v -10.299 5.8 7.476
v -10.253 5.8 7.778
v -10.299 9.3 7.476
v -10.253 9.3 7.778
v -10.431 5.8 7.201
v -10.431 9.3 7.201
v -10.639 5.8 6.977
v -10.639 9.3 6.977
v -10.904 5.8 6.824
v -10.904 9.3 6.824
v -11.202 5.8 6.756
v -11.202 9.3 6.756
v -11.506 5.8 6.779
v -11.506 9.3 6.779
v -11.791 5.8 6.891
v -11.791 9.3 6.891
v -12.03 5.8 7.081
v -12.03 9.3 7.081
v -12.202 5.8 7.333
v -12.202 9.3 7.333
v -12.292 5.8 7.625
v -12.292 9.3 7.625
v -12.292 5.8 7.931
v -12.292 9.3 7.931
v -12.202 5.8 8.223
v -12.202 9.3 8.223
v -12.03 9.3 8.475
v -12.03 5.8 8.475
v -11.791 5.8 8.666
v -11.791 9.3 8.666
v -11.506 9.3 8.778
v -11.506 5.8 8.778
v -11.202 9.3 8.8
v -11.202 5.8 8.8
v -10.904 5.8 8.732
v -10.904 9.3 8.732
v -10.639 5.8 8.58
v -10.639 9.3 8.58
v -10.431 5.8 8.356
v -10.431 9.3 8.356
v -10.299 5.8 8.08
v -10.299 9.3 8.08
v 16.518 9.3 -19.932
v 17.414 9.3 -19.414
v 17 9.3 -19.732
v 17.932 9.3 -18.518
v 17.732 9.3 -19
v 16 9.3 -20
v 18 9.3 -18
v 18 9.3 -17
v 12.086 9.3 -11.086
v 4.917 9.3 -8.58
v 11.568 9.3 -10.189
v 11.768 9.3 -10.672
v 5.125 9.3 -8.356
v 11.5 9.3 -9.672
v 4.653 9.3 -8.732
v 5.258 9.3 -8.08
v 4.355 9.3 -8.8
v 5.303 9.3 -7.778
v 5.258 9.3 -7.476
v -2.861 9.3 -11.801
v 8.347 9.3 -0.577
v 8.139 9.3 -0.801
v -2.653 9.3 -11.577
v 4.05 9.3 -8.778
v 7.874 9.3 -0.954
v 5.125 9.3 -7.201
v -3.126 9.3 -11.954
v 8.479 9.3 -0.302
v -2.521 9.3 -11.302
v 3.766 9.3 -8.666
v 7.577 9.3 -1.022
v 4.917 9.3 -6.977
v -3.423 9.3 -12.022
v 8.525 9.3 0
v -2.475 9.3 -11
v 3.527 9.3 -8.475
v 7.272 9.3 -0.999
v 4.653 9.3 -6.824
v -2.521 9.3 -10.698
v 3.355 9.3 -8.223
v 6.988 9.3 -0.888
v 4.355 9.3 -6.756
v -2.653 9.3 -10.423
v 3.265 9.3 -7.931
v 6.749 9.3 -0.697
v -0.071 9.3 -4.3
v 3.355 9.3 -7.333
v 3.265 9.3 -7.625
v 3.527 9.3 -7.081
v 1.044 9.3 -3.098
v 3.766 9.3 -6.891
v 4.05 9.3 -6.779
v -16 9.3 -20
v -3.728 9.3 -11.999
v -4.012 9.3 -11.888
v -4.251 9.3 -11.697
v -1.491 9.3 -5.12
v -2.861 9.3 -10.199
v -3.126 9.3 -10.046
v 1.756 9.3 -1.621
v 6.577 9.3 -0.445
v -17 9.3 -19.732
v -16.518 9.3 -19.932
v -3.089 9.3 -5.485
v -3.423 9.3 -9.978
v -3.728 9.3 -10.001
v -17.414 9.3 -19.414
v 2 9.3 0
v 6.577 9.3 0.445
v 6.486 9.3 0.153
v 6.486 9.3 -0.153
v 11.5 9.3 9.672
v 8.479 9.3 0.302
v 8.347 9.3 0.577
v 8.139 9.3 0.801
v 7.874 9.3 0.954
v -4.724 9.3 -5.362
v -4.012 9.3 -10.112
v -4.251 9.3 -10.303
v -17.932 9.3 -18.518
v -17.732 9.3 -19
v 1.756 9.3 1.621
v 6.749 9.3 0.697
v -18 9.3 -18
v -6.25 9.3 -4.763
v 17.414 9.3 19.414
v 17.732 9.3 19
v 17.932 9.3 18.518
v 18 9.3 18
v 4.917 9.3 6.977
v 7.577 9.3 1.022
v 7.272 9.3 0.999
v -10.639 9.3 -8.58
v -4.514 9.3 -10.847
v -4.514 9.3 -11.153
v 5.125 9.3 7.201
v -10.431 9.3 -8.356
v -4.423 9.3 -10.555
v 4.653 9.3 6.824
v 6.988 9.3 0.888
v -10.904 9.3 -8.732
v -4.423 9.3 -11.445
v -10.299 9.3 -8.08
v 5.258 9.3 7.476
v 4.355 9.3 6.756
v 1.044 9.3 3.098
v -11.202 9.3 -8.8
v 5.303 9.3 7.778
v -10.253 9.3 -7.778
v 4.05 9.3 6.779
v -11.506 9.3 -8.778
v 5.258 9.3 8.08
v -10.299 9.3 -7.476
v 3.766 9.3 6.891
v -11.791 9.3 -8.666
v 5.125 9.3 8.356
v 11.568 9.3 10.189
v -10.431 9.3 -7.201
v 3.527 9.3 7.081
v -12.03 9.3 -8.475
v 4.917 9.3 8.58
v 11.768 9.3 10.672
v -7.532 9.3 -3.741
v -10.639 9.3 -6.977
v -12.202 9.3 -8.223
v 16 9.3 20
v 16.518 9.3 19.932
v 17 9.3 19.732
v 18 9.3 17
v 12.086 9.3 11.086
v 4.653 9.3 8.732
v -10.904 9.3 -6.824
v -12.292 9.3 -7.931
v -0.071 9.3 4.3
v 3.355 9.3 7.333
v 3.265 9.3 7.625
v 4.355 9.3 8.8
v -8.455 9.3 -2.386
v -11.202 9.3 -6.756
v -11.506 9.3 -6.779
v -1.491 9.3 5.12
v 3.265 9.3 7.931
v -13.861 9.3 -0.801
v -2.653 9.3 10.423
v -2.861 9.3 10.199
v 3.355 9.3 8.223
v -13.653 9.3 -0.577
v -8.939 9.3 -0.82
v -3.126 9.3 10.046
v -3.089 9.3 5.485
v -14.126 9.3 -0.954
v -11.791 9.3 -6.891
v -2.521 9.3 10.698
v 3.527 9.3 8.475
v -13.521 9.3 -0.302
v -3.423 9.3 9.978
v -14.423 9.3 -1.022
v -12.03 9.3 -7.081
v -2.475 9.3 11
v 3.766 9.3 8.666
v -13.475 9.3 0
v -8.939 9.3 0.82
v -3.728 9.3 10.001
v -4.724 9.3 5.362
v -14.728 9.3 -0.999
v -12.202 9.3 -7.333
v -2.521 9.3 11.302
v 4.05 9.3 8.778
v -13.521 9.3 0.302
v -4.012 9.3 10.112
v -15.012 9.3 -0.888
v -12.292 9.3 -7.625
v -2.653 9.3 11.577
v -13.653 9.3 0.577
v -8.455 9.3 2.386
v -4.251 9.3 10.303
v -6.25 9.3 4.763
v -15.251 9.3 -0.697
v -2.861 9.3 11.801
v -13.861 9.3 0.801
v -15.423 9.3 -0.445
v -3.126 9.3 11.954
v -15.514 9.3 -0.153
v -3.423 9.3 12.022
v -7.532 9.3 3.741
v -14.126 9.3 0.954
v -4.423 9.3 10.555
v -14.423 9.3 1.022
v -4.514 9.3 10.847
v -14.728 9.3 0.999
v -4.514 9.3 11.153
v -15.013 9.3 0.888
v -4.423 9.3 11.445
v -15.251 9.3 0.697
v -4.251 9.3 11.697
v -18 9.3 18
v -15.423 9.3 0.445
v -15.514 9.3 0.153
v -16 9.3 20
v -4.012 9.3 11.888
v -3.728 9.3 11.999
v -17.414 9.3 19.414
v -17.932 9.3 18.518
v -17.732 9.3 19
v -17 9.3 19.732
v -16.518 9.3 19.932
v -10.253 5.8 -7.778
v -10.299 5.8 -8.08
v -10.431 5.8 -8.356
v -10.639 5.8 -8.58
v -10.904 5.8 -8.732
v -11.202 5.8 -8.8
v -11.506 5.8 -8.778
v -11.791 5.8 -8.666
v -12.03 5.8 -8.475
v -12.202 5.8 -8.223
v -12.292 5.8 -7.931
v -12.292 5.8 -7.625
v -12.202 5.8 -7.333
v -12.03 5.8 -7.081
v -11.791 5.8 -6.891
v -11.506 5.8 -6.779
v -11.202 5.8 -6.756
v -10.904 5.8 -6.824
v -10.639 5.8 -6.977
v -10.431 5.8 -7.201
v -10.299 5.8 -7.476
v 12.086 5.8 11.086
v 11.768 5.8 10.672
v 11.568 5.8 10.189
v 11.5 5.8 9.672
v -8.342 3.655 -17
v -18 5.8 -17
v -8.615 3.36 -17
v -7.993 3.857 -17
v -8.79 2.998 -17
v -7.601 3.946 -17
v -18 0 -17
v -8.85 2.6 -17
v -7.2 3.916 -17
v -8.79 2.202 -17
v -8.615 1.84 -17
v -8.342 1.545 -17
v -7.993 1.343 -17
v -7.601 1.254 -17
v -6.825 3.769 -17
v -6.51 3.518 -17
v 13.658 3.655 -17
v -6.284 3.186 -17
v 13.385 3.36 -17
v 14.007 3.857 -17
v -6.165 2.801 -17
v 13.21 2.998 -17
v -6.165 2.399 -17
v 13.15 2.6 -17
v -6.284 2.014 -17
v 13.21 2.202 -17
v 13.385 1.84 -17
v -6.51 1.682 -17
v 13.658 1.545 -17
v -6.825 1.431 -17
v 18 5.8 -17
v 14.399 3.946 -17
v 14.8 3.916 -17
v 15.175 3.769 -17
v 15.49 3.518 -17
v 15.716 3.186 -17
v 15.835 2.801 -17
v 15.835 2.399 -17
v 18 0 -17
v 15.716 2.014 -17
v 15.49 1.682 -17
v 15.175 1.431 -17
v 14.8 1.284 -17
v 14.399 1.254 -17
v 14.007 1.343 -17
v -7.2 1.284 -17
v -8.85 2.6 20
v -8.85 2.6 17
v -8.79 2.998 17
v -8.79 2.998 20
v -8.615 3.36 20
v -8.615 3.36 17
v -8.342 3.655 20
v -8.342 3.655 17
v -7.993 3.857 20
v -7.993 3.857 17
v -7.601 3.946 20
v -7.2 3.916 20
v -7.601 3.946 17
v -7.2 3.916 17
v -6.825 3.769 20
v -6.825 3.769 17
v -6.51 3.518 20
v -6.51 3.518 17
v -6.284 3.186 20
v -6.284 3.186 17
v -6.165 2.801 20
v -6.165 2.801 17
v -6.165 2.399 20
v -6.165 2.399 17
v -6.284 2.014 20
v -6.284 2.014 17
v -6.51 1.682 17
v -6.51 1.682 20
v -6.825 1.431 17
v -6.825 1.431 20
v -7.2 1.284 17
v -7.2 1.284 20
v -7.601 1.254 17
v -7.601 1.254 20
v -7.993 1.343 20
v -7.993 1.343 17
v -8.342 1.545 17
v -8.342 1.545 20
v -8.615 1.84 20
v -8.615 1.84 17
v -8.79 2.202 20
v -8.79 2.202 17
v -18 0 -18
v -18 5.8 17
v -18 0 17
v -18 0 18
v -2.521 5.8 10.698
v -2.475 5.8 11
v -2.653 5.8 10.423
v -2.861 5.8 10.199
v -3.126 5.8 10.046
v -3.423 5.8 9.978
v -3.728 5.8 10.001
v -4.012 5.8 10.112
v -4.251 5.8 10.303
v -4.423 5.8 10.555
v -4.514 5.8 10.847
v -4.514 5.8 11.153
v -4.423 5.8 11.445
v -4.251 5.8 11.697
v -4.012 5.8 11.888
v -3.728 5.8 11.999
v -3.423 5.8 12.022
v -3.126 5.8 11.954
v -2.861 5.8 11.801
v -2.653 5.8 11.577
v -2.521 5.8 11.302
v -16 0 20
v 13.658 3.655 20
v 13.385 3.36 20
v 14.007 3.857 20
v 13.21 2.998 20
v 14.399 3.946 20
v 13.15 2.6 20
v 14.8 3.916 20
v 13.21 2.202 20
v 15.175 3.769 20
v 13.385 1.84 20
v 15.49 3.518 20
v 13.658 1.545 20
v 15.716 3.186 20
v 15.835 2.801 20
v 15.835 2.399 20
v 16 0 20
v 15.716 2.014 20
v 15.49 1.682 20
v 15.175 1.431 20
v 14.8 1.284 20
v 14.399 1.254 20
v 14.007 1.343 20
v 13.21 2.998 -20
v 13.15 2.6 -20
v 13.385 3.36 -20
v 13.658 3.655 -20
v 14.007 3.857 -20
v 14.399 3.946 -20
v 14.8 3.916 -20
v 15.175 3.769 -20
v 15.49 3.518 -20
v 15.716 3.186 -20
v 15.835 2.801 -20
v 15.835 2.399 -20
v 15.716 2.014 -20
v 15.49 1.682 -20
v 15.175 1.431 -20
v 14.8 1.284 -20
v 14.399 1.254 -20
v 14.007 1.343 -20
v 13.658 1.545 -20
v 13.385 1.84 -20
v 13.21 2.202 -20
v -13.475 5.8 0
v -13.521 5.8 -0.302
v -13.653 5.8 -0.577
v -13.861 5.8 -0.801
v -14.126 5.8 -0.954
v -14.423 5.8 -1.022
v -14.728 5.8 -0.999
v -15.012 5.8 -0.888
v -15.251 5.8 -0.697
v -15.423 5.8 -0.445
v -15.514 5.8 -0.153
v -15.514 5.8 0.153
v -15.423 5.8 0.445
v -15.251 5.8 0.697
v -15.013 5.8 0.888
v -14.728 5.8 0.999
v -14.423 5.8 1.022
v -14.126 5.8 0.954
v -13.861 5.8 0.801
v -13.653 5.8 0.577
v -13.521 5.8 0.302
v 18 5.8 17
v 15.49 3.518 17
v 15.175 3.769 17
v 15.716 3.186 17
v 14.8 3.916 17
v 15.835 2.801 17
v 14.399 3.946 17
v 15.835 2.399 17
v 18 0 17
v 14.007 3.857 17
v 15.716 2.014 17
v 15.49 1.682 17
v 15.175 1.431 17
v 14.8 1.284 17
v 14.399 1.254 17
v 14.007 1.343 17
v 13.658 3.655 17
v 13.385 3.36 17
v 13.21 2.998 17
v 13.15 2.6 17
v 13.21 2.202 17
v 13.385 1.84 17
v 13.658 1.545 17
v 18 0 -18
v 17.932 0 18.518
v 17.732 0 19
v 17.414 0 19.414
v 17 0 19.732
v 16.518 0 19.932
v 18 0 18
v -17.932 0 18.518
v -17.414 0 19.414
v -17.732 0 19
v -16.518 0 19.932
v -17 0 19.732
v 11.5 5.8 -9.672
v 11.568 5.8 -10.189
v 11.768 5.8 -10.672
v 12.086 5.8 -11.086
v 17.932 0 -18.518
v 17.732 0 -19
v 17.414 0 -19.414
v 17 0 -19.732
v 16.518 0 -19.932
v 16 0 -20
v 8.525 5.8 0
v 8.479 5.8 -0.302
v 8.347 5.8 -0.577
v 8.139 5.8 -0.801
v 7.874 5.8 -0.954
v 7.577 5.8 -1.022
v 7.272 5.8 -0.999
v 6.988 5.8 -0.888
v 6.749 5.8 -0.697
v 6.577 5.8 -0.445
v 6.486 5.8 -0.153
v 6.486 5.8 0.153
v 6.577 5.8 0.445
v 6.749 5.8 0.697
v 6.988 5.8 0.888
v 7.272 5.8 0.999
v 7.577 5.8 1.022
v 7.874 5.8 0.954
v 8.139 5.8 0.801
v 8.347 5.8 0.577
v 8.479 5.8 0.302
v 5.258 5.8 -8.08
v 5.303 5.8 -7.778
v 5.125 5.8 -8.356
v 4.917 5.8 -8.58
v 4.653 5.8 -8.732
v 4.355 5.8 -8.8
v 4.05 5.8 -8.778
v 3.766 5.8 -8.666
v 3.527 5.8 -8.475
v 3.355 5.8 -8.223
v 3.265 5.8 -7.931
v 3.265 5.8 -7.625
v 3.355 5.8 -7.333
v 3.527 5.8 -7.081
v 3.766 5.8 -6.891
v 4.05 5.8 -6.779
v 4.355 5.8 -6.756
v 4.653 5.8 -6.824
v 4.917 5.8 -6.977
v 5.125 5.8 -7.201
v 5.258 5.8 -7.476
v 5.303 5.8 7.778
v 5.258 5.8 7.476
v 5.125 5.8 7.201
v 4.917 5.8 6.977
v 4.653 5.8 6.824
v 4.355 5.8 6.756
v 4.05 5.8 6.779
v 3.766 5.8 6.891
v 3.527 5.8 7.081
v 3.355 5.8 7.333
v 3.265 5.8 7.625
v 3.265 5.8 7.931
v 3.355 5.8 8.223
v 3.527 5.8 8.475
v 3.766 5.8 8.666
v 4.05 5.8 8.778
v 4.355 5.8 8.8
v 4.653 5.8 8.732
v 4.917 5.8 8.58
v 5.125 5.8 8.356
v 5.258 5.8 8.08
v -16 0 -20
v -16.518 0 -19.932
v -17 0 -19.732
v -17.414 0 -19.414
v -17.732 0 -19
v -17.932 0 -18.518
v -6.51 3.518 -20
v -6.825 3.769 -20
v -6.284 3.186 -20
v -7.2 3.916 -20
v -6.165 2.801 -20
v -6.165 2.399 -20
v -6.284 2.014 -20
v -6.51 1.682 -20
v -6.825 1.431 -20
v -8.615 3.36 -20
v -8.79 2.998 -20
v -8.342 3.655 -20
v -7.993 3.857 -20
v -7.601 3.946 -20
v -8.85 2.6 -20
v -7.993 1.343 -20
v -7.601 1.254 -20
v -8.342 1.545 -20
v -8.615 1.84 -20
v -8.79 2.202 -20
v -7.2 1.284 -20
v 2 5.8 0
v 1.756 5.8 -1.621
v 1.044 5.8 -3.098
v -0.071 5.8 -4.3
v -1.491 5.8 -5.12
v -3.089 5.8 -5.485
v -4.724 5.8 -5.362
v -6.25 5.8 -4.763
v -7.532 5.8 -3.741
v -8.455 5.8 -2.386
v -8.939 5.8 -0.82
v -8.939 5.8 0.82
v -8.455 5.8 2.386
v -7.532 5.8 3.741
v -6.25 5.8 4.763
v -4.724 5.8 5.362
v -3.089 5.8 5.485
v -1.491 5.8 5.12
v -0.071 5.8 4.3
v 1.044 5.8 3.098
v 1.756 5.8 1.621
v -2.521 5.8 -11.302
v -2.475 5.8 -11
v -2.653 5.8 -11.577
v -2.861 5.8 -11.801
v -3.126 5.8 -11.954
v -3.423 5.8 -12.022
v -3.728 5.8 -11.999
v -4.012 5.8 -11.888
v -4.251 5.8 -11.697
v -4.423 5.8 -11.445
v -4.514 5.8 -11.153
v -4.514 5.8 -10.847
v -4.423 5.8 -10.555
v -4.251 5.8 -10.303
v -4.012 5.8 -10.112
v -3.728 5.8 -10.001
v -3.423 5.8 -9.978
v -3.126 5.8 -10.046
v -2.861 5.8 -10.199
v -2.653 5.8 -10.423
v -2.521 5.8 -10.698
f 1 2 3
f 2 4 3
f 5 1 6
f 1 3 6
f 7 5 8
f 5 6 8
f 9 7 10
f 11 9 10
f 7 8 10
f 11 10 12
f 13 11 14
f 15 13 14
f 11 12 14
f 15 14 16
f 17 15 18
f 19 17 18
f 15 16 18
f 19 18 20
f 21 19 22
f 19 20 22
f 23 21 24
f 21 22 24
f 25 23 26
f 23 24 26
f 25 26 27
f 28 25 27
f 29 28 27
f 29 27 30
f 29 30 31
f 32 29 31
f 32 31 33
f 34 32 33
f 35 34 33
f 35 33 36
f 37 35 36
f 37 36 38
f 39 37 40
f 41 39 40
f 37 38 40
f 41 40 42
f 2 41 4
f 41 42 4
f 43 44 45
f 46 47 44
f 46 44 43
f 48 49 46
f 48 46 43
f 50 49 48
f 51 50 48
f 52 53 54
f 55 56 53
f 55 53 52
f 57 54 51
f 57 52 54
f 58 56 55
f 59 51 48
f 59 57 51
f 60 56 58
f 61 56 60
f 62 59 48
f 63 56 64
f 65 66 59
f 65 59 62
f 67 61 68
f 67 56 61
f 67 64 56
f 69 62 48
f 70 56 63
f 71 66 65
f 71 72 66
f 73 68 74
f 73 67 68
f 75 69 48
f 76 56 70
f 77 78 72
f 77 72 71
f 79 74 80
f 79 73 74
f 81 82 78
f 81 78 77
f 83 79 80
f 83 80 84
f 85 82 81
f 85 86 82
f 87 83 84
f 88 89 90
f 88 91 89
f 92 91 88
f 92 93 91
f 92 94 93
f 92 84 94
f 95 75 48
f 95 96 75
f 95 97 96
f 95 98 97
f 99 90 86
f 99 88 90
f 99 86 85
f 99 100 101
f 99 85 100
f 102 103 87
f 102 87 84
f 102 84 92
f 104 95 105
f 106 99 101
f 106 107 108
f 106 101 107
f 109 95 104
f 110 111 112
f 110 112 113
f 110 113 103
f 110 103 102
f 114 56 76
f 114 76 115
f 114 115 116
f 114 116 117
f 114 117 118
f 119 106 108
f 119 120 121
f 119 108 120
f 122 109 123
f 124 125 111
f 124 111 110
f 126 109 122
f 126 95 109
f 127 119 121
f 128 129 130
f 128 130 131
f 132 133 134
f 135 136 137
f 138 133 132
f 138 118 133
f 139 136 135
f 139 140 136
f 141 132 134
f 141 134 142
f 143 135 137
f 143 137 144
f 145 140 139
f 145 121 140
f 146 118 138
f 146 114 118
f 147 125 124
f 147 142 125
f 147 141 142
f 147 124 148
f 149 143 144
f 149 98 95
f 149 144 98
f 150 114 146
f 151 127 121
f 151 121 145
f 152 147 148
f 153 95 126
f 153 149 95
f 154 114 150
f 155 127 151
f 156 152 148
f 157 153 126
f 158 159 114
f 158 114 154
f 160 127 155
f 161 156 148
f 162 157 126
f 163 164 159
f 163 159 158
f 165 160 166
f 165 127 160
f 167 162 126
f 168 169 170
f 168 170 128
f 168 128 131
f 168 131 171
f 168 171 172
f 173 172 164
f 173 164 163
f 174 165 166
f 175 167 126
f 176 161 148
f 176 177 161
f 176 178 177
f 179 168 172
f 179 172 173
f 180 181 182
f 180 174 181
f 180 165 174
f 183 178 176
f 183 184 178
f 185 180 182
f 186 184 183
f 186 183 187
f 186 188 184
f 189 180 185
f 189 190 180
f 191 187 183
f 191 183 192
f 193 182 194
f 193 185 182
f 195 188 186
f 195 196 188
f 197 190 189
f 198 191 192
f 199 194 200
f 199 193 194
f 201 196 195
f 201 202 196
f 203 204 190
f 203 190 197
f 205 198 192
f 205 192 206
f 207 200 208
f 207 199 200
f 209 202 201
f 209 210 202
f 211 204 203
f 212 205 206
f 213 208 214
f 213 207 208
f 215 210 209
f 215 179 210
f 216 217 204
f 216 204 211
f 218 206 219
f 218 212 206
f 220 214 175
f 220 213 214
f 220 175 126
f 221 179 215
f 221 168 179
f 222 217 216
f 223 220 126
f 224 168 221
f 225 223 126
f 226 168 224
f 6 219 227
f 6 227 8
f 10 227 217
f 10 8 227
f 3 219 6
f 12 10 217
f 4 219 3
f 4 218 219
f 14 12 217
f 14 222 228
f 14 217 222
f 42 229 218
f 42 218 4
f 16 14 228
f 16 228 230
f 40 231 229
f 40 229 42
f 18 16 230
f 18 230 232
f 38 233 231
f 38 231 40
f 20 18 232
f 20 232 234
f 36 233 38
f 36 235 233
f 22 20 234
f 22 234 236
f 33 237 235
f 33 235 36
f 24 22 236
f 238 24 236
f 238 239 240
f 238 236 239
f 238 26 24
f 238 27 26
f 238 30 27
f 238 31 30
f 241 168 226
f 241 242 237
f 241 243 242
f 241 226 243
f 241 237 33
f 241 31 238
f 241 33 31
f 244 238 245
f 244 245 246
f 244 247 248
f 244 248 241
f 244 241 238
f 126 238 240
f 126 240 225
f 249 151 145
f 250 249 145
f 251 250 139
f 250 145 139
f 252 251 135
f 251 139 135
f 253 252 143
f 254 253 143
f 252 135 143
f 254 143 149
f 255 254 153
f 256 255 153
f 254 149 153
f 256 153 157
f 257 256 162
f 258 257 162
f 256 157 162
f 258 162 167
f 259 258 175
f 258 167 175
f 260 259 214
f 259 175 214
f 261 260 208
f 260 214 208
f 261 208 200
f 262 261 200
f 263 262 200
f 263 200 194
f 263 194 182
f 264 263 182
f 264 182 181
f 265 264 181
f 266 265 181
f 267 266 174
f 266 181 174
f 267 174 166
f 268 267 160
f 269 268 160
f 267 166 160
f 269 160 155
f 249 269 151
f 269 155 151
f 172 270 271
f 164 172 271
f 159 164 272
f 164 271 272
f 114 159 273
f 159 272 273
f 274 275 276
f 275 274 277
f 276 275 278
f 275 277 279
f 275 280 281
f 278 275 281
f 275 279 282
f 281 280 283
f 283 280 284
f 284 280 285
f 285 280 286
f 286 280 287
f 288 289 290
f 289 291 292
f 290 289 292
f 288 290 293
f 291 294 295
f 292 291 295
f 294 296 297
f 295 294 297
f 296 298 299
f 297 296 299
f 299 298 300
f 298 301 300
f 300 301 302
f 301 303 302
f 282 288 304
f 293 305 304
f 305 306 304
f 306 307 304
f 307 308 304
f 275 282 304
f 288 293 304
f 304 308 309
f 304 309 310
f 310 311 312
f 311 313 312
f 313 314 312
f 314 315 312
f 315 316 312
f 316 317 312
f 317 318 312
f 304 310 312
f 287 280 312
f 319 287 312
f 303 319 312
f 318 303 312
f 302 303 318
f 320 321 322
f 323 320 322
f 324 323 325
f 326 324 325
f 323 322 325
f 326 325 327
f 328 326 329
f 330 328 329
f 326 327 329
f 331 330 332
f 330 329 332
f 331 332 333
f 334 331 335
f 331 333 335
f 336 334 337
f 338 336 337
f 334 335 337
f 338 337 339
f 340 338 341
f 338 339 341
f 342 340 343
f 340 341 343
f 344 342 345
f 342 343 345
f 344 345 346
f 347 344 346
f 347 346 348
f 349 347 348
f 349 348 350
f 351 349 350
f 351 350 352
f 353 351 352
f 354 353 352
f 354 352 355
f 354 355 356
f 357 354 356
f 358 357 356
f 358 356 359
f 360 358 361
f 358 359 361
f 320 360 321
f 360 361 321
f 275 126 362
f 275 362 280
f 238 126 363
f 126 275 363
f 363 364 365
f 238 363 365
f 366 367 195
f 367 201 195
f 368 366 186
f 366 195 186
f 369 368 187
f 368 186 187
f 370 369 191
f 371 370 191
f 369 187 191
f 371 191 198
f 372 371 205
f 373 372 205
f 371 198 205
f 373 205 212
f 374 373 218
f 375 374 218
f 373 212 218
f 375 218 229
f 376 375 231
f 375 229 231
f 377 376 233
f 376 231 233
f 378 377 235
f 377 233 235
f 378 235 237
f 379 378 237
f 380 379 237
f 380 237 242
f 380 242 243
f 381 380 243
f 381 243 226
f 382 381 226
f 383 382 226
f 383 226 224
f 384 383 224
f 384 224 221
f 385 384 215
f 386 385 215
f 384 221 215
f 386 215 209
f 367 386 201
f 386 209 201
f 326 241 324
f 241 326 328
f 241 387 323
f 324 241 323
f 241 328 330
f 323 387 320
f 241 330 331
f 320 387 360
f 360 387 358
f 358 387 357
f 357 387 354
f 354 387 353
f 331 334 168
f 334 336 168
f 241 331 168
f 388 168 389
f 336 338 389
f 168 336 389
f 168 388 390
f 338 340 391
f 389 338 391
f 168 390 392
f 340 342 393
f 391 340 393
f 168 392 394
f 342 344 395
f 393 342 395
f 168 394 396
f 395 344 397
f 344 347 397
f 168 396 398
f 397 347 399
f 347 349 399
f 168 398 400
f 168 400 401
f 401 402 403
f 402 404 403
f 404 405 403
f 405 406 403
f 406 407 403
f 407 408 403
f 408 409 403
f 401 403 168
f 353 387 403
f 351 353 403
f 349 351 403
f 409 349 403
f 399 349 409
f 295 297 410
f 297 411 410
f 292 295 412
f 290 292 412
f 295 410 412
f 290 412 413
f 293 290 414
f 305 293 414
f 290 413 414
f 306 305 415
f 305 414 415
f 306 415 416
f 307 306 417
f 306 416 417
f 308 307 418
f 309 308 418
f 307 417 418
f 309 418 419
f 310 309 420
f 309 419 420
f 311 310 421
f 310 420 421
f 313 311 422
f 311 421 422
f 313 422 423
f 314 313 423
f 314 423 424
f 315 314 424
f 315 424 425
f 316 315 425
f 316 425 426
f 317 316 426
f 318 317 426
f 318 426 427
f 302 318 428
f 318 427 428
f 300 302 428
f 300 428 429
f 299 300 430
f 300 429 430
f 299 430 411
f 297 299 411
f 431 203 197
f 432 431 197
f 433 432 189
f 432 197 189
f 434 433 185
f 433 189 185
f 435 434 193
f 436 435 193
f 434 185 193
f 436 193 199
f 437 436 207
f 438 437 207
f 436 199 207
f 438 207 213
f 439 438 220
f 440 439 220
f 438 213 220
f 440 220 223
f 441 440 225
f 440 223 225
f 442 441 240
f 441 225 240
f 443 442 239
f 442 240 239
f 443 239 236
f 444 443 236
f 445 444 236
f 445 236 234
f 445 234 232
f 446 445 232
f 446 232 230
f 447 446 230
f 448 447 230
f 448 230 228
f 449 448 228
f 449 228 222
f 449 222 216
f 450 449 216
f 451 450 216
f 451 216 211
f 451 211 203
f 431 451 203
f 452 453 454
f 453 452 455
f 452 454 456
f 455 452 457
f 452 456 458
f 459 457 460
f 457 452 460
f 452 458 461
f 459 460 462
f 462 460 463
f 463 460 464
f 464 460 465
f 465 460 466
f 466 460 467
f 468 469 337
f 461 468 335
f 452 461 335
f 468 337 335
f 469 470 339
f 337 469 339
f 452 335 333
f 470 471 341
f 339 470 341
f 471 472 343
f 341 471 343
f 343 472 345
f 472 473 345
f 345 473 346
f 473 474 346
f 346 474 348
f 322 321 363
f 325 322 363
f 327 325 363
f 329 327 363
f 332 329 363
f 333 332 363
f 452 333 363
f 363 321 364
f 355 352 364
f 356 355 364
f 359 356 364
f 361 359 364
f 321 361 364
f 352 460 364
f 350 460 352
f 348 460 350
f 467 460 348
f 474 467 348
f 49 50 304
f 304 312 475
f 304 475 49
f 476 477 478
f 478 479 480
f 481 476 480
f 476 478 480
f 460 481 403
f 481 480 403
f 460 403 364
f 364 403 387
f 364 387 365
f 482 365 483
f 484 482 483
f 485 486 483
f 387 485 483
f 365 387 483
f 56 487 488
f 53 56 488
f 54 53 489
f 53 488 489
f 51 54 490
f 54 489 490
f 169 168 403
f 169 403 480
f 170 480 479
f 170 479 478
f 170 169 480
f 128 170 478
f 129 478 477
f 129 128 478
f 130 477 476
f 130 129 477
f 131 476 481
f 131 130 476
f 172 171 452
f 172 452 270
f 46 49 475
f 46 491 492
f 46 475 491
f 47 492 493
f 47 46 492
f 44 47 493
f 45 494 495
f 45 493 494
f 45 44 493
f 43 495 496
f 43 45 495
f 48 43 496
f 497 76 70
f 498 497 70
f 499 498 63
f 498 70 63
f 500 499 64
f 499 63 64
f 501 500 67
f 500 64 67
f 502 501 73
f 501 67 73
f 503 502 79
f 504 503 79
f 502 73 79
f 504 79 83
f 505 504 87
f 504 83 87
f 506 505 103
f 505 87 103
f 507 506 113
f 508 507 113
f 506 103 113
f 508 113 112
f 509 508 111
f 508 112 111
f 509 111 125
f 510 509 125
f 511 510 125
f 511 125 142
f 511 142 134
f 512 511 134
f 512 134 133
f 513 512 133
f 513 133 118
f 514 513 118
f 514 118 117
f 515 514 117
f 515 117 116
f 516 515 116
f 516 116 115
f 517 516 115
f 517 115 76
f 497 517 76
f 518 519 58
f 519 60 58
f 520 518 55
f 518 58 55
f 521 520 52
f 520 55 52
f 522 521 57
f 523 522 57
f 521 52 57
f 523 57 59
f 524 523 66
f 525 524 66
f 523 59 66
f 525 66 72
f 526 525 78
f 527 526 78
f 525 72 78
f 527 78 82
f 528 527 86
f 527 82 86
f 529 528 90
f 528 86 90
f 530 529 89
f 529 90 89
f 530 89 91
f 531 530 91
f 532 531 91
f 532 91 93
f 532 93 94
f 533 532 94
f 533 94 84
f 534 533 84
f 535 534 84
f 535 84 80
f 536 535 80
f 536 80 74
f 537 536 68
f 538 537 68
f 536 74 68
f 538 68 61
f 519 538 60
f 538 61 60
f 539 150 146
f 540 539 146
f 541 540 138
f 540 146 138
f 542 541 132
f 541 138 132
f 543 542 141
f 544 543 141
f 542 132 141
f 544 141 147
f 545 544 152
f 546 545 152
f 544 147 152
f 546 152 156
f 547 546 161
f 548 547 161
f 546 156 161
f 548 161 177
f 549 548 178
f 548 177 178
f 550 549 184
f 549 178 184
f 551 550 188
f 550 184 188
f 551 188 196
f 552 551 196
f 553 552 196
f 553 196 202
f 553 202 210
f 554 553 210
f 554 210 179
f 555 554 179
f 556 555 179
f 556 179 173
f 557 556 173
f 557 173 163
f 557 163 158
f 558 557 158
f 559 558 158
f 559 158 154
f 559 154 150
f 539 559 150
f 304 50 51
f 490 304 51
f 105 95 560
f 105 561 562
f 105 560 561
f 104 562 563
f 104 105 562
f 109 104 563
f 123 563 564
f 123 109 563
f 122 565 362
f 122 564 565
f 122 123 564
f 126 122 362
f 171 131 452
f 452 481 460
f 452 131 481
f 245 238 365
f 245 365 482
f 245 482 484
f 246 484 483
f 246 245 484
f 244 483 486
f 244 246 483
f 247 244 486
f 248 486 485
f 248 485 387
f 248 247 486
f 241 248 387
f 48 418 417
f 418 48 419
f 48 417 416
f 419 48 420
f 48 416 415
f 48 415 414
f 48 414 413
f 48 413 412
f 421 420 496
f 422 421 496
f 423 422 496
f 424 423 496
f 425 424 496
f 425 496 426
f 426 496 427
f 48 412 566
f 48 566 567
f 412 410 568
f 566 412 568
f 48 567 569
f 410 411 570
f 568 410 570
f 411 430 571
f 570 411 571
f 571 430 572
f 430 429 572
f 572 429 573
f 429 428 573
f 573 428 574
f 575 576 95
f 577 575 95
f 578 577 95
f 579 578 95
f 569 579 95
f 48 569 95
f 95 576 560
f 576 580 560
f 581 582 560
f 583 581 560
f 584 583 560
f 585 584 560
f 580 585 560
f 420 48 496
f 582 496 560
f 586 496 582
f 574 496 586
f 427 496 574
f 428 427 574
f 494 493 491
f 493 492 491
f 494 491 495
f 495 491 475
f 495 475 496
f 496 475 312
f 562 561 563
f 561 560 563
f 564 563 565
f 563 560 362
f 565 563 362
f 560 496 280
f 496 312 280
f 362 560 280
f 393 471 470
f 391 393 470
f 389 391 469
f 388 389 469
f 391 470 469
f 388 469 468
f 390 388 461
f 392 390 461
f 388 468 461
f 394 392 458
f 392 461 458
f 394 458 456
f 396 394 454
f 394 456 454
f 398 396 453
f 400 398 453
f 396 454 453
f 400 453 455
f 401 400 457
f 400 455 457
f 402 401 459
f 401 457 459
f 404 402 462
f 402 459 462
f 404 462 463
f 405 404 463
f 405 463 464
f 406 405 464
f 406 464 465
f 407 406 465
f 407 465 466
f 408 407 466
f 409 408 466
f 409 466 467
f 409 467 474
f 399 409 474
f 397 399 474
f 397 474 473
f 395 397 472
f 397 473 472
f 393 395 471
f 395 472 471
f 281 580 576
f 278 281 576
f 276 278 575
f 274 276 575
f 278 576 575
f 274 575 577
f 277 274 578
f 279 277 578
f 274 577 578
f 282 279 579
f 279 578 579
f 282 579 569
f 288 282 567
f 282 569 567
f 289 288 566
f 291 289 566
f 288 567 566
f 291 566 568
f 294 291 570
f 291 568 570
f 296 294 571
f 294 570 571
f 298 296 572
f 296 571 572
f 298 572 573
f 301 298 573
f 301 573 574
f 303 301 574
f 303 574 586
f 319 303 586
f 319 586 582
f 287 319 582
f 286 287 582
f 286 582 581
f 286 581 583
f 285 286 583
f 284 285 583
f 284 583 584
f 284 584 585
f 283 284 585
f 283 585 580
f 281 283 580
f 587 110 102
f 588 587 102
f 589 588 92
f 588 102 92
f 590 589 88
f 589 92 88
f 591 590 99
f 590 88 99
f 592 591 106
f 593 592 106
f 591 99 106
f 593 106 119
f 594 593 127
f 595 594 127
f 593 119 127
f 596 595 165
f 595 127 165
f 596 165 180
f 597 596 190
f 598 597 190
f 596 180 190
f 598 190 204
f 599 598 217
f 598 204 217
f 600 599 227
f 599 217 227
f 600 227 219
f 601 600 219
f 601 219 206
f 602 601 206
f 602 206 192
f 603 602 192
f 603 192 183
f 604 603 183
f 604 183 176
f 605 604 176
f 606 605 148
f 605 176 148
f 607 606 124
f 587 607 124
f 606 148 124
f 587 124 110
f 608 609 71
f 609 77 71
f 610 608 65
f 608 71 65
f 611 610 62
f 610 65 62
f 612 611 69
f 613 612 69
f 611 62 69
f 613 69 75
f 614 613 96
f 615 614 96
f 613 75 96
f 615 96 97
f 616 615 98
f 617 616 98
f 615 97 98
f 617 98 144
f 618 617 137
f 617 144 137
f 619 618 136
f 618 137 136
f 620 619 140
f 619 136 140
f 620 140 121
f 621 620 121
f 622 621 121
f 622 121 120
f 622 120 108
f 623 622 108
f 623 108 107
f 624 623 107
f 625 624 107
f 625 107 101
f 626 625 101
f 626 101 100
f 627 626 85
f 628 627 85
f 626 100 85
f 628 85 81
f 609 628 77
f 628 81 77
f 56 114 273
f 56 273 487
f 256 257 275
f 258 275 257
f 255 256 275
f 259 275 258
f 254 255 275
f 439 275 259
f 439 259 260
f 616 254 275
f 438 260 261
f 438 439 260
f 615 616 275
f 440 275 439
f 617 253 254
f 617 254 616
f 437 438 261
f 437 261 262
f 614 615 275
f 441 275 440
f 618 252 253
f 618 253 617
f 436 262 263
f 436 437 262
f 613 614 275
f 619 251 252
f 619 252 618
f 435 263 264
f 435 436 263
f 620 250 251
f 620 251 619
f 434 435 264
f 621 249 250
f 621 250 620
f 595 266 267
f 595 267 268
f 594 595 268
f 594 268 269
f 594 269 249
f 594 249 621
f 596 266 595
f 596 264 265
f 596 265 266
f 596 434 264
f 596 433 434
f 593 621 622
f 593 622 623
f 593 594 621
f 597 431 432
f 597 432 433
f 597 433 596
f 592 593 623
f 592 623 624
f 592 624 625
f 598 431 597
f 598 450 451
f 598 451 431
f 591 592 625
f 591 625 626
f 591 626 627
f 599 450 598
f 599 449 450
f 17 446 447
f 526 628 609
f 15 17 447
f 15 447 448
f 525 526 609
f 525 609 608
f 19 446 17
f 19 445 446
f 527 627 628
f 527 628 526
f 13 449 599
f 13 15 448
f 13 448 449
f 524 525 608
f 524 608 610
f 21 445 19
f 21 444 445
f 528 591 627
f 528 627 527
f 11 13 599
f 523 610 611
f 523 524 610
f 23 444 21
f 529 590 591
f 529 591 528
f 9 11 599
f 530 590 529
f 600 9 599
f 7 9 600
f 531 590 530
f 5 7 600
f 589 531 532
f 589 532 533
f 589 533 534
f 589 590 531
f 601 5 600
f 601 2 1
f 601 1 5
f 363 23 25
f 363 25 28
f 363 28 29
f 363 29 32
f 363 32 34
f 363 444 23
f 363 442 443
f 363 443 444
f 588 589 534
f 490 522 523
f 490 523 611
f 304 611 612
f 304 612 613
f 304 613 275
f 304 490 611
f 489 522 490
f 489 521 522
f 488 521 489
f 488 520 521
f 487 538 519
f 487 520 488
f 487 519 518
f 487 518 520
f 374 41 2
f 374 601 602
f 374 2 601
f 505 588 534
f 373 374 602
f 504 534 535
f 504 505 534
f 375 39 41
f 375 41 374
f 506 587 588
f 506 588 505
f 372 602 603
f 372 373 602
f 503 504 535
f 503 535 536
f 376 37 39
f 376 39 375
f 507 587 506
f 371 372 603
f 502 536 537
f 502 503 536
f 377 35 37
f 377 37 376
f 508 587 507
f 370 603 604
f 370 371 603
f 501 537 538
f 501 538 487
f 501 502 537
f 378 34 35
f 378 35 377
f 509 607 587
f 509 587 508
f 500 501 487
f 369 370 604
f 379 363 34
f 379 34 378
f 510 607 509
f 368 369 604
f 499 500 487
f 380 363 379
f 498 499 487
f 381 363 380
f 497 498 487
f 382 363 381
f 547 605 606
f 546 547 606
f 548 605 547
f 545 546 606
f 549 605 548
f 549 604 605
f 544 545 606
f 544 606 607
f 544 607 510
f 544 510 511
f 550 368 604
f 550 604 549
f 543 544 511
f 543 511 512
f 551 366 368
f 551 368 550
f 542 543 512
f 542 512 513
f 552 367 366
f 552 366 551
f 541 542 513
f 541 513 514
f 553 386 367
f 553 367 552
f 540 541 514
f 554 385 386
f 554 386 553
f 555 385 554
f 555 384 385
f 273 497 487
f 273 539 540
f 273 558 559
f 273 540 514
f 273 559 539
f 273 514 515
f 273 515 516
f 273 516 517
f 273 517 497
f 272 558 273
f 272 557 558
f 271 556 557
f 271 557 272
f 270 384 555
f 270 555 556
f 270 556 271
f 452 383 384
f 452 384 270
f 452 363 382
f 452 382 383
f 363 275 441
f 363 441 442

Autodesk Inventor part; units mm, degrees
ref_plane "YZ Plane" through (0, 0, 0) normal (1, 0, 0) x (0, 1, 0)
ref_plane "XZ Plane" through (0, 0, 0) normal (0, 1, 0) x (-1, 0, 0)
ref_plane "XY Plane" through (0, 0, 0) normal (0, 0, 1) x (1, 0, 0)
sketch "Sketch2" plane through (0, 0, 0) normal (0, 1, 0) x (-1, 0, 0)
  line L0 (18, 20) -> (-18, 20)
  line L1 (-18, 20) -> (-18, -20)
  line L2 (-18, -20) -> (18, -20)
  line L3 (18, -20) -> (18, 20)
  line L4 (18, 20) -> (-18, -20) construction
  line L5 (-18, 20) -> (18, -20) construction
  point P0 (0, 0)
  dimension "d0" = 36
  dimension "d1" = 40
extrude "Extrusion1" add sketch "Sketch2" along normal blind 9.3
sketch "Sketch3" plane through (0, 0, 0) normal (0, -1, 0) x (1, 0, 0)
  line L0 (-18, -17) -> (18, -17)
  line L1 (18, -17) -> (18, 17)
  line L2 (18, 17) -> (-18, 17)
  line L3 (-18, 17) -> (-18, -17)
  line L4 (-18, -17) -> (18, 17) construction
  line L5 (18, -17) -> (-18, 17) construction
  point P0 (0, 0)
  dimension "d4" = 36
  dimension "d5" = 34
extrude "Extrusion2" cut sketch "Sketch3" against normal blind 5.8
sketch "Sketch4" plane through (18, 0, -20) normal (0, 0, -1) x (-1, 0, 0)
  line L0 (0, 0) -> (36, 0) projected
  line L1 (36, 0) -> (36, 9.3) projected
  line L2 (0, 9.3) -> (36, 9.3) projected
  line L3 (0, 0) -> (0, 9.3) projected
  line L4 (36, 0) -> (0, 0) construction
  line L5 (0, 0) -> (0, 2.6) construction
  line L6 (0, 0) -> (0, 9.3) construction
  line L7 (0, 2.6) -> (3.5, 2.6) construction
  line L8 (3.5, 2.6) -> (25.5, 2.6) construction
  circle A0 centre (3.5, 2.6) radius 1.35
  circle A1 centre (25.5, 2.6) radius 1.35
  point P0 (18, 0)
  dimension "d8" = 2.6
  dimension "d9" = 3.5
  dimension "d10" = 22
  dimension "d11" = 180
  dimension "d12" = 2.7
  dimension "d13" = 2.7
extrude "Extrusion3" cut sketch "Sketch4" against normal up to surface (40 mm away) contours A0 | A1
sketch "Sketch5" plane through (0, 9.3, 0) normal (0, 1, 0) x (1, 0, 0)
  line L0 (18, -17) -> (18, 17) projected
  line L1 (18, 0) -> (7.5, 0)
  line L2 (18, 0) -> (28.5, 0) construction
  line L3 (7.5, 0) -> (-3.5, 0)
  line L4 (7.5, 0) -> (18.5, 0) construction
  circle A0 centre (7.5, 0) radius 1.025
  circle A1 centre (4.2782, 7.7782) radius 1.025
  circle A2 centre (-3.5, 11) radius 1.025
  circle A3 centre (-11.2782, 7.7782) radius 1.025
  circle A4 centre (-14.5, 0) radius 1.025
  circle A5 centre (-11.2782, -7.7782) radius 1.025
  circle A6 centre (-3.5, -11) radius 1.025
  circle A7 centre (4.2782, -7.7782) radius 1.025
  circle A8 centre (-3.5, 0) radius 5.5
  point P0 (0, 0)
  dimension "d16" = 10.5
  dimension "d17" = 180
  dimension "d18" = 11
  dimension "d19" = 180
  dimension "d20" = 2.05
  dimension "d23" = 360
  dimension "d25" = 11
extrude "Extrusion4" cut sketch "Sketch5" against normal up to surface (3.5 mm away)
sketch "Sketch6" plane through (0, 9.3, 0) normal (0, 1, 0) x (1, 0, 0)
  line L0 (18, 17) -> (-18, 17) projected
  line L1 (-18, 20) -> (-18, 17) projected
  line L2 (18, 20) -> (-18, 20) projected
  line L3 (18, 17) -> (18, 20) projected
  line L4 (-18, -17) -> (18, -17) projected
  line L5 (18, -20) -> (18, -17) projected
  line L6 (-18, -20) -> (18, -20) projected
  line L7 (-18, -17) -> (-18, -20) projected
  line L8 (18, -17) -> (18, 17) projected
  line L9 (18, 0) -> (11.5, 0)
  line L10 (11.5, 0) -> (11.5, 17)
  line L11 (11.5, 0) -> (11.5, -17)
  line L12 (18, 17) -> (11.5, 10.5)
  line L13 (18, 17) -> (27.1924, 17) construction
  line L14 (-18, -17) -> (18, -17) projected
  line L15 (18, -17) -> (11.5, -10.5)
  line L16 (18, -17) -> (27.1924, -17) construction
  point P0 (0, 0)
  dimension "d28" = 6.5
  dimension "d29" = 135
  dimension "d30" = 135
extrude "Extrusion5" cut sketch "Sketch6" against normal up to surface (3.5 mm away) contours L8 L9 L10 L12 | L8 L15 L11 L9
fillet "Fillet1" radius 2 6 edges at (11.5, 7.55, -10.5) (18, 4.65, -20) (11.5, 7.55, 10.5) (18, 4.65, 20) (-18, 4.65, 20) (-18, 4.65, -20)
properties part number "connector_shoulder_jasper"
